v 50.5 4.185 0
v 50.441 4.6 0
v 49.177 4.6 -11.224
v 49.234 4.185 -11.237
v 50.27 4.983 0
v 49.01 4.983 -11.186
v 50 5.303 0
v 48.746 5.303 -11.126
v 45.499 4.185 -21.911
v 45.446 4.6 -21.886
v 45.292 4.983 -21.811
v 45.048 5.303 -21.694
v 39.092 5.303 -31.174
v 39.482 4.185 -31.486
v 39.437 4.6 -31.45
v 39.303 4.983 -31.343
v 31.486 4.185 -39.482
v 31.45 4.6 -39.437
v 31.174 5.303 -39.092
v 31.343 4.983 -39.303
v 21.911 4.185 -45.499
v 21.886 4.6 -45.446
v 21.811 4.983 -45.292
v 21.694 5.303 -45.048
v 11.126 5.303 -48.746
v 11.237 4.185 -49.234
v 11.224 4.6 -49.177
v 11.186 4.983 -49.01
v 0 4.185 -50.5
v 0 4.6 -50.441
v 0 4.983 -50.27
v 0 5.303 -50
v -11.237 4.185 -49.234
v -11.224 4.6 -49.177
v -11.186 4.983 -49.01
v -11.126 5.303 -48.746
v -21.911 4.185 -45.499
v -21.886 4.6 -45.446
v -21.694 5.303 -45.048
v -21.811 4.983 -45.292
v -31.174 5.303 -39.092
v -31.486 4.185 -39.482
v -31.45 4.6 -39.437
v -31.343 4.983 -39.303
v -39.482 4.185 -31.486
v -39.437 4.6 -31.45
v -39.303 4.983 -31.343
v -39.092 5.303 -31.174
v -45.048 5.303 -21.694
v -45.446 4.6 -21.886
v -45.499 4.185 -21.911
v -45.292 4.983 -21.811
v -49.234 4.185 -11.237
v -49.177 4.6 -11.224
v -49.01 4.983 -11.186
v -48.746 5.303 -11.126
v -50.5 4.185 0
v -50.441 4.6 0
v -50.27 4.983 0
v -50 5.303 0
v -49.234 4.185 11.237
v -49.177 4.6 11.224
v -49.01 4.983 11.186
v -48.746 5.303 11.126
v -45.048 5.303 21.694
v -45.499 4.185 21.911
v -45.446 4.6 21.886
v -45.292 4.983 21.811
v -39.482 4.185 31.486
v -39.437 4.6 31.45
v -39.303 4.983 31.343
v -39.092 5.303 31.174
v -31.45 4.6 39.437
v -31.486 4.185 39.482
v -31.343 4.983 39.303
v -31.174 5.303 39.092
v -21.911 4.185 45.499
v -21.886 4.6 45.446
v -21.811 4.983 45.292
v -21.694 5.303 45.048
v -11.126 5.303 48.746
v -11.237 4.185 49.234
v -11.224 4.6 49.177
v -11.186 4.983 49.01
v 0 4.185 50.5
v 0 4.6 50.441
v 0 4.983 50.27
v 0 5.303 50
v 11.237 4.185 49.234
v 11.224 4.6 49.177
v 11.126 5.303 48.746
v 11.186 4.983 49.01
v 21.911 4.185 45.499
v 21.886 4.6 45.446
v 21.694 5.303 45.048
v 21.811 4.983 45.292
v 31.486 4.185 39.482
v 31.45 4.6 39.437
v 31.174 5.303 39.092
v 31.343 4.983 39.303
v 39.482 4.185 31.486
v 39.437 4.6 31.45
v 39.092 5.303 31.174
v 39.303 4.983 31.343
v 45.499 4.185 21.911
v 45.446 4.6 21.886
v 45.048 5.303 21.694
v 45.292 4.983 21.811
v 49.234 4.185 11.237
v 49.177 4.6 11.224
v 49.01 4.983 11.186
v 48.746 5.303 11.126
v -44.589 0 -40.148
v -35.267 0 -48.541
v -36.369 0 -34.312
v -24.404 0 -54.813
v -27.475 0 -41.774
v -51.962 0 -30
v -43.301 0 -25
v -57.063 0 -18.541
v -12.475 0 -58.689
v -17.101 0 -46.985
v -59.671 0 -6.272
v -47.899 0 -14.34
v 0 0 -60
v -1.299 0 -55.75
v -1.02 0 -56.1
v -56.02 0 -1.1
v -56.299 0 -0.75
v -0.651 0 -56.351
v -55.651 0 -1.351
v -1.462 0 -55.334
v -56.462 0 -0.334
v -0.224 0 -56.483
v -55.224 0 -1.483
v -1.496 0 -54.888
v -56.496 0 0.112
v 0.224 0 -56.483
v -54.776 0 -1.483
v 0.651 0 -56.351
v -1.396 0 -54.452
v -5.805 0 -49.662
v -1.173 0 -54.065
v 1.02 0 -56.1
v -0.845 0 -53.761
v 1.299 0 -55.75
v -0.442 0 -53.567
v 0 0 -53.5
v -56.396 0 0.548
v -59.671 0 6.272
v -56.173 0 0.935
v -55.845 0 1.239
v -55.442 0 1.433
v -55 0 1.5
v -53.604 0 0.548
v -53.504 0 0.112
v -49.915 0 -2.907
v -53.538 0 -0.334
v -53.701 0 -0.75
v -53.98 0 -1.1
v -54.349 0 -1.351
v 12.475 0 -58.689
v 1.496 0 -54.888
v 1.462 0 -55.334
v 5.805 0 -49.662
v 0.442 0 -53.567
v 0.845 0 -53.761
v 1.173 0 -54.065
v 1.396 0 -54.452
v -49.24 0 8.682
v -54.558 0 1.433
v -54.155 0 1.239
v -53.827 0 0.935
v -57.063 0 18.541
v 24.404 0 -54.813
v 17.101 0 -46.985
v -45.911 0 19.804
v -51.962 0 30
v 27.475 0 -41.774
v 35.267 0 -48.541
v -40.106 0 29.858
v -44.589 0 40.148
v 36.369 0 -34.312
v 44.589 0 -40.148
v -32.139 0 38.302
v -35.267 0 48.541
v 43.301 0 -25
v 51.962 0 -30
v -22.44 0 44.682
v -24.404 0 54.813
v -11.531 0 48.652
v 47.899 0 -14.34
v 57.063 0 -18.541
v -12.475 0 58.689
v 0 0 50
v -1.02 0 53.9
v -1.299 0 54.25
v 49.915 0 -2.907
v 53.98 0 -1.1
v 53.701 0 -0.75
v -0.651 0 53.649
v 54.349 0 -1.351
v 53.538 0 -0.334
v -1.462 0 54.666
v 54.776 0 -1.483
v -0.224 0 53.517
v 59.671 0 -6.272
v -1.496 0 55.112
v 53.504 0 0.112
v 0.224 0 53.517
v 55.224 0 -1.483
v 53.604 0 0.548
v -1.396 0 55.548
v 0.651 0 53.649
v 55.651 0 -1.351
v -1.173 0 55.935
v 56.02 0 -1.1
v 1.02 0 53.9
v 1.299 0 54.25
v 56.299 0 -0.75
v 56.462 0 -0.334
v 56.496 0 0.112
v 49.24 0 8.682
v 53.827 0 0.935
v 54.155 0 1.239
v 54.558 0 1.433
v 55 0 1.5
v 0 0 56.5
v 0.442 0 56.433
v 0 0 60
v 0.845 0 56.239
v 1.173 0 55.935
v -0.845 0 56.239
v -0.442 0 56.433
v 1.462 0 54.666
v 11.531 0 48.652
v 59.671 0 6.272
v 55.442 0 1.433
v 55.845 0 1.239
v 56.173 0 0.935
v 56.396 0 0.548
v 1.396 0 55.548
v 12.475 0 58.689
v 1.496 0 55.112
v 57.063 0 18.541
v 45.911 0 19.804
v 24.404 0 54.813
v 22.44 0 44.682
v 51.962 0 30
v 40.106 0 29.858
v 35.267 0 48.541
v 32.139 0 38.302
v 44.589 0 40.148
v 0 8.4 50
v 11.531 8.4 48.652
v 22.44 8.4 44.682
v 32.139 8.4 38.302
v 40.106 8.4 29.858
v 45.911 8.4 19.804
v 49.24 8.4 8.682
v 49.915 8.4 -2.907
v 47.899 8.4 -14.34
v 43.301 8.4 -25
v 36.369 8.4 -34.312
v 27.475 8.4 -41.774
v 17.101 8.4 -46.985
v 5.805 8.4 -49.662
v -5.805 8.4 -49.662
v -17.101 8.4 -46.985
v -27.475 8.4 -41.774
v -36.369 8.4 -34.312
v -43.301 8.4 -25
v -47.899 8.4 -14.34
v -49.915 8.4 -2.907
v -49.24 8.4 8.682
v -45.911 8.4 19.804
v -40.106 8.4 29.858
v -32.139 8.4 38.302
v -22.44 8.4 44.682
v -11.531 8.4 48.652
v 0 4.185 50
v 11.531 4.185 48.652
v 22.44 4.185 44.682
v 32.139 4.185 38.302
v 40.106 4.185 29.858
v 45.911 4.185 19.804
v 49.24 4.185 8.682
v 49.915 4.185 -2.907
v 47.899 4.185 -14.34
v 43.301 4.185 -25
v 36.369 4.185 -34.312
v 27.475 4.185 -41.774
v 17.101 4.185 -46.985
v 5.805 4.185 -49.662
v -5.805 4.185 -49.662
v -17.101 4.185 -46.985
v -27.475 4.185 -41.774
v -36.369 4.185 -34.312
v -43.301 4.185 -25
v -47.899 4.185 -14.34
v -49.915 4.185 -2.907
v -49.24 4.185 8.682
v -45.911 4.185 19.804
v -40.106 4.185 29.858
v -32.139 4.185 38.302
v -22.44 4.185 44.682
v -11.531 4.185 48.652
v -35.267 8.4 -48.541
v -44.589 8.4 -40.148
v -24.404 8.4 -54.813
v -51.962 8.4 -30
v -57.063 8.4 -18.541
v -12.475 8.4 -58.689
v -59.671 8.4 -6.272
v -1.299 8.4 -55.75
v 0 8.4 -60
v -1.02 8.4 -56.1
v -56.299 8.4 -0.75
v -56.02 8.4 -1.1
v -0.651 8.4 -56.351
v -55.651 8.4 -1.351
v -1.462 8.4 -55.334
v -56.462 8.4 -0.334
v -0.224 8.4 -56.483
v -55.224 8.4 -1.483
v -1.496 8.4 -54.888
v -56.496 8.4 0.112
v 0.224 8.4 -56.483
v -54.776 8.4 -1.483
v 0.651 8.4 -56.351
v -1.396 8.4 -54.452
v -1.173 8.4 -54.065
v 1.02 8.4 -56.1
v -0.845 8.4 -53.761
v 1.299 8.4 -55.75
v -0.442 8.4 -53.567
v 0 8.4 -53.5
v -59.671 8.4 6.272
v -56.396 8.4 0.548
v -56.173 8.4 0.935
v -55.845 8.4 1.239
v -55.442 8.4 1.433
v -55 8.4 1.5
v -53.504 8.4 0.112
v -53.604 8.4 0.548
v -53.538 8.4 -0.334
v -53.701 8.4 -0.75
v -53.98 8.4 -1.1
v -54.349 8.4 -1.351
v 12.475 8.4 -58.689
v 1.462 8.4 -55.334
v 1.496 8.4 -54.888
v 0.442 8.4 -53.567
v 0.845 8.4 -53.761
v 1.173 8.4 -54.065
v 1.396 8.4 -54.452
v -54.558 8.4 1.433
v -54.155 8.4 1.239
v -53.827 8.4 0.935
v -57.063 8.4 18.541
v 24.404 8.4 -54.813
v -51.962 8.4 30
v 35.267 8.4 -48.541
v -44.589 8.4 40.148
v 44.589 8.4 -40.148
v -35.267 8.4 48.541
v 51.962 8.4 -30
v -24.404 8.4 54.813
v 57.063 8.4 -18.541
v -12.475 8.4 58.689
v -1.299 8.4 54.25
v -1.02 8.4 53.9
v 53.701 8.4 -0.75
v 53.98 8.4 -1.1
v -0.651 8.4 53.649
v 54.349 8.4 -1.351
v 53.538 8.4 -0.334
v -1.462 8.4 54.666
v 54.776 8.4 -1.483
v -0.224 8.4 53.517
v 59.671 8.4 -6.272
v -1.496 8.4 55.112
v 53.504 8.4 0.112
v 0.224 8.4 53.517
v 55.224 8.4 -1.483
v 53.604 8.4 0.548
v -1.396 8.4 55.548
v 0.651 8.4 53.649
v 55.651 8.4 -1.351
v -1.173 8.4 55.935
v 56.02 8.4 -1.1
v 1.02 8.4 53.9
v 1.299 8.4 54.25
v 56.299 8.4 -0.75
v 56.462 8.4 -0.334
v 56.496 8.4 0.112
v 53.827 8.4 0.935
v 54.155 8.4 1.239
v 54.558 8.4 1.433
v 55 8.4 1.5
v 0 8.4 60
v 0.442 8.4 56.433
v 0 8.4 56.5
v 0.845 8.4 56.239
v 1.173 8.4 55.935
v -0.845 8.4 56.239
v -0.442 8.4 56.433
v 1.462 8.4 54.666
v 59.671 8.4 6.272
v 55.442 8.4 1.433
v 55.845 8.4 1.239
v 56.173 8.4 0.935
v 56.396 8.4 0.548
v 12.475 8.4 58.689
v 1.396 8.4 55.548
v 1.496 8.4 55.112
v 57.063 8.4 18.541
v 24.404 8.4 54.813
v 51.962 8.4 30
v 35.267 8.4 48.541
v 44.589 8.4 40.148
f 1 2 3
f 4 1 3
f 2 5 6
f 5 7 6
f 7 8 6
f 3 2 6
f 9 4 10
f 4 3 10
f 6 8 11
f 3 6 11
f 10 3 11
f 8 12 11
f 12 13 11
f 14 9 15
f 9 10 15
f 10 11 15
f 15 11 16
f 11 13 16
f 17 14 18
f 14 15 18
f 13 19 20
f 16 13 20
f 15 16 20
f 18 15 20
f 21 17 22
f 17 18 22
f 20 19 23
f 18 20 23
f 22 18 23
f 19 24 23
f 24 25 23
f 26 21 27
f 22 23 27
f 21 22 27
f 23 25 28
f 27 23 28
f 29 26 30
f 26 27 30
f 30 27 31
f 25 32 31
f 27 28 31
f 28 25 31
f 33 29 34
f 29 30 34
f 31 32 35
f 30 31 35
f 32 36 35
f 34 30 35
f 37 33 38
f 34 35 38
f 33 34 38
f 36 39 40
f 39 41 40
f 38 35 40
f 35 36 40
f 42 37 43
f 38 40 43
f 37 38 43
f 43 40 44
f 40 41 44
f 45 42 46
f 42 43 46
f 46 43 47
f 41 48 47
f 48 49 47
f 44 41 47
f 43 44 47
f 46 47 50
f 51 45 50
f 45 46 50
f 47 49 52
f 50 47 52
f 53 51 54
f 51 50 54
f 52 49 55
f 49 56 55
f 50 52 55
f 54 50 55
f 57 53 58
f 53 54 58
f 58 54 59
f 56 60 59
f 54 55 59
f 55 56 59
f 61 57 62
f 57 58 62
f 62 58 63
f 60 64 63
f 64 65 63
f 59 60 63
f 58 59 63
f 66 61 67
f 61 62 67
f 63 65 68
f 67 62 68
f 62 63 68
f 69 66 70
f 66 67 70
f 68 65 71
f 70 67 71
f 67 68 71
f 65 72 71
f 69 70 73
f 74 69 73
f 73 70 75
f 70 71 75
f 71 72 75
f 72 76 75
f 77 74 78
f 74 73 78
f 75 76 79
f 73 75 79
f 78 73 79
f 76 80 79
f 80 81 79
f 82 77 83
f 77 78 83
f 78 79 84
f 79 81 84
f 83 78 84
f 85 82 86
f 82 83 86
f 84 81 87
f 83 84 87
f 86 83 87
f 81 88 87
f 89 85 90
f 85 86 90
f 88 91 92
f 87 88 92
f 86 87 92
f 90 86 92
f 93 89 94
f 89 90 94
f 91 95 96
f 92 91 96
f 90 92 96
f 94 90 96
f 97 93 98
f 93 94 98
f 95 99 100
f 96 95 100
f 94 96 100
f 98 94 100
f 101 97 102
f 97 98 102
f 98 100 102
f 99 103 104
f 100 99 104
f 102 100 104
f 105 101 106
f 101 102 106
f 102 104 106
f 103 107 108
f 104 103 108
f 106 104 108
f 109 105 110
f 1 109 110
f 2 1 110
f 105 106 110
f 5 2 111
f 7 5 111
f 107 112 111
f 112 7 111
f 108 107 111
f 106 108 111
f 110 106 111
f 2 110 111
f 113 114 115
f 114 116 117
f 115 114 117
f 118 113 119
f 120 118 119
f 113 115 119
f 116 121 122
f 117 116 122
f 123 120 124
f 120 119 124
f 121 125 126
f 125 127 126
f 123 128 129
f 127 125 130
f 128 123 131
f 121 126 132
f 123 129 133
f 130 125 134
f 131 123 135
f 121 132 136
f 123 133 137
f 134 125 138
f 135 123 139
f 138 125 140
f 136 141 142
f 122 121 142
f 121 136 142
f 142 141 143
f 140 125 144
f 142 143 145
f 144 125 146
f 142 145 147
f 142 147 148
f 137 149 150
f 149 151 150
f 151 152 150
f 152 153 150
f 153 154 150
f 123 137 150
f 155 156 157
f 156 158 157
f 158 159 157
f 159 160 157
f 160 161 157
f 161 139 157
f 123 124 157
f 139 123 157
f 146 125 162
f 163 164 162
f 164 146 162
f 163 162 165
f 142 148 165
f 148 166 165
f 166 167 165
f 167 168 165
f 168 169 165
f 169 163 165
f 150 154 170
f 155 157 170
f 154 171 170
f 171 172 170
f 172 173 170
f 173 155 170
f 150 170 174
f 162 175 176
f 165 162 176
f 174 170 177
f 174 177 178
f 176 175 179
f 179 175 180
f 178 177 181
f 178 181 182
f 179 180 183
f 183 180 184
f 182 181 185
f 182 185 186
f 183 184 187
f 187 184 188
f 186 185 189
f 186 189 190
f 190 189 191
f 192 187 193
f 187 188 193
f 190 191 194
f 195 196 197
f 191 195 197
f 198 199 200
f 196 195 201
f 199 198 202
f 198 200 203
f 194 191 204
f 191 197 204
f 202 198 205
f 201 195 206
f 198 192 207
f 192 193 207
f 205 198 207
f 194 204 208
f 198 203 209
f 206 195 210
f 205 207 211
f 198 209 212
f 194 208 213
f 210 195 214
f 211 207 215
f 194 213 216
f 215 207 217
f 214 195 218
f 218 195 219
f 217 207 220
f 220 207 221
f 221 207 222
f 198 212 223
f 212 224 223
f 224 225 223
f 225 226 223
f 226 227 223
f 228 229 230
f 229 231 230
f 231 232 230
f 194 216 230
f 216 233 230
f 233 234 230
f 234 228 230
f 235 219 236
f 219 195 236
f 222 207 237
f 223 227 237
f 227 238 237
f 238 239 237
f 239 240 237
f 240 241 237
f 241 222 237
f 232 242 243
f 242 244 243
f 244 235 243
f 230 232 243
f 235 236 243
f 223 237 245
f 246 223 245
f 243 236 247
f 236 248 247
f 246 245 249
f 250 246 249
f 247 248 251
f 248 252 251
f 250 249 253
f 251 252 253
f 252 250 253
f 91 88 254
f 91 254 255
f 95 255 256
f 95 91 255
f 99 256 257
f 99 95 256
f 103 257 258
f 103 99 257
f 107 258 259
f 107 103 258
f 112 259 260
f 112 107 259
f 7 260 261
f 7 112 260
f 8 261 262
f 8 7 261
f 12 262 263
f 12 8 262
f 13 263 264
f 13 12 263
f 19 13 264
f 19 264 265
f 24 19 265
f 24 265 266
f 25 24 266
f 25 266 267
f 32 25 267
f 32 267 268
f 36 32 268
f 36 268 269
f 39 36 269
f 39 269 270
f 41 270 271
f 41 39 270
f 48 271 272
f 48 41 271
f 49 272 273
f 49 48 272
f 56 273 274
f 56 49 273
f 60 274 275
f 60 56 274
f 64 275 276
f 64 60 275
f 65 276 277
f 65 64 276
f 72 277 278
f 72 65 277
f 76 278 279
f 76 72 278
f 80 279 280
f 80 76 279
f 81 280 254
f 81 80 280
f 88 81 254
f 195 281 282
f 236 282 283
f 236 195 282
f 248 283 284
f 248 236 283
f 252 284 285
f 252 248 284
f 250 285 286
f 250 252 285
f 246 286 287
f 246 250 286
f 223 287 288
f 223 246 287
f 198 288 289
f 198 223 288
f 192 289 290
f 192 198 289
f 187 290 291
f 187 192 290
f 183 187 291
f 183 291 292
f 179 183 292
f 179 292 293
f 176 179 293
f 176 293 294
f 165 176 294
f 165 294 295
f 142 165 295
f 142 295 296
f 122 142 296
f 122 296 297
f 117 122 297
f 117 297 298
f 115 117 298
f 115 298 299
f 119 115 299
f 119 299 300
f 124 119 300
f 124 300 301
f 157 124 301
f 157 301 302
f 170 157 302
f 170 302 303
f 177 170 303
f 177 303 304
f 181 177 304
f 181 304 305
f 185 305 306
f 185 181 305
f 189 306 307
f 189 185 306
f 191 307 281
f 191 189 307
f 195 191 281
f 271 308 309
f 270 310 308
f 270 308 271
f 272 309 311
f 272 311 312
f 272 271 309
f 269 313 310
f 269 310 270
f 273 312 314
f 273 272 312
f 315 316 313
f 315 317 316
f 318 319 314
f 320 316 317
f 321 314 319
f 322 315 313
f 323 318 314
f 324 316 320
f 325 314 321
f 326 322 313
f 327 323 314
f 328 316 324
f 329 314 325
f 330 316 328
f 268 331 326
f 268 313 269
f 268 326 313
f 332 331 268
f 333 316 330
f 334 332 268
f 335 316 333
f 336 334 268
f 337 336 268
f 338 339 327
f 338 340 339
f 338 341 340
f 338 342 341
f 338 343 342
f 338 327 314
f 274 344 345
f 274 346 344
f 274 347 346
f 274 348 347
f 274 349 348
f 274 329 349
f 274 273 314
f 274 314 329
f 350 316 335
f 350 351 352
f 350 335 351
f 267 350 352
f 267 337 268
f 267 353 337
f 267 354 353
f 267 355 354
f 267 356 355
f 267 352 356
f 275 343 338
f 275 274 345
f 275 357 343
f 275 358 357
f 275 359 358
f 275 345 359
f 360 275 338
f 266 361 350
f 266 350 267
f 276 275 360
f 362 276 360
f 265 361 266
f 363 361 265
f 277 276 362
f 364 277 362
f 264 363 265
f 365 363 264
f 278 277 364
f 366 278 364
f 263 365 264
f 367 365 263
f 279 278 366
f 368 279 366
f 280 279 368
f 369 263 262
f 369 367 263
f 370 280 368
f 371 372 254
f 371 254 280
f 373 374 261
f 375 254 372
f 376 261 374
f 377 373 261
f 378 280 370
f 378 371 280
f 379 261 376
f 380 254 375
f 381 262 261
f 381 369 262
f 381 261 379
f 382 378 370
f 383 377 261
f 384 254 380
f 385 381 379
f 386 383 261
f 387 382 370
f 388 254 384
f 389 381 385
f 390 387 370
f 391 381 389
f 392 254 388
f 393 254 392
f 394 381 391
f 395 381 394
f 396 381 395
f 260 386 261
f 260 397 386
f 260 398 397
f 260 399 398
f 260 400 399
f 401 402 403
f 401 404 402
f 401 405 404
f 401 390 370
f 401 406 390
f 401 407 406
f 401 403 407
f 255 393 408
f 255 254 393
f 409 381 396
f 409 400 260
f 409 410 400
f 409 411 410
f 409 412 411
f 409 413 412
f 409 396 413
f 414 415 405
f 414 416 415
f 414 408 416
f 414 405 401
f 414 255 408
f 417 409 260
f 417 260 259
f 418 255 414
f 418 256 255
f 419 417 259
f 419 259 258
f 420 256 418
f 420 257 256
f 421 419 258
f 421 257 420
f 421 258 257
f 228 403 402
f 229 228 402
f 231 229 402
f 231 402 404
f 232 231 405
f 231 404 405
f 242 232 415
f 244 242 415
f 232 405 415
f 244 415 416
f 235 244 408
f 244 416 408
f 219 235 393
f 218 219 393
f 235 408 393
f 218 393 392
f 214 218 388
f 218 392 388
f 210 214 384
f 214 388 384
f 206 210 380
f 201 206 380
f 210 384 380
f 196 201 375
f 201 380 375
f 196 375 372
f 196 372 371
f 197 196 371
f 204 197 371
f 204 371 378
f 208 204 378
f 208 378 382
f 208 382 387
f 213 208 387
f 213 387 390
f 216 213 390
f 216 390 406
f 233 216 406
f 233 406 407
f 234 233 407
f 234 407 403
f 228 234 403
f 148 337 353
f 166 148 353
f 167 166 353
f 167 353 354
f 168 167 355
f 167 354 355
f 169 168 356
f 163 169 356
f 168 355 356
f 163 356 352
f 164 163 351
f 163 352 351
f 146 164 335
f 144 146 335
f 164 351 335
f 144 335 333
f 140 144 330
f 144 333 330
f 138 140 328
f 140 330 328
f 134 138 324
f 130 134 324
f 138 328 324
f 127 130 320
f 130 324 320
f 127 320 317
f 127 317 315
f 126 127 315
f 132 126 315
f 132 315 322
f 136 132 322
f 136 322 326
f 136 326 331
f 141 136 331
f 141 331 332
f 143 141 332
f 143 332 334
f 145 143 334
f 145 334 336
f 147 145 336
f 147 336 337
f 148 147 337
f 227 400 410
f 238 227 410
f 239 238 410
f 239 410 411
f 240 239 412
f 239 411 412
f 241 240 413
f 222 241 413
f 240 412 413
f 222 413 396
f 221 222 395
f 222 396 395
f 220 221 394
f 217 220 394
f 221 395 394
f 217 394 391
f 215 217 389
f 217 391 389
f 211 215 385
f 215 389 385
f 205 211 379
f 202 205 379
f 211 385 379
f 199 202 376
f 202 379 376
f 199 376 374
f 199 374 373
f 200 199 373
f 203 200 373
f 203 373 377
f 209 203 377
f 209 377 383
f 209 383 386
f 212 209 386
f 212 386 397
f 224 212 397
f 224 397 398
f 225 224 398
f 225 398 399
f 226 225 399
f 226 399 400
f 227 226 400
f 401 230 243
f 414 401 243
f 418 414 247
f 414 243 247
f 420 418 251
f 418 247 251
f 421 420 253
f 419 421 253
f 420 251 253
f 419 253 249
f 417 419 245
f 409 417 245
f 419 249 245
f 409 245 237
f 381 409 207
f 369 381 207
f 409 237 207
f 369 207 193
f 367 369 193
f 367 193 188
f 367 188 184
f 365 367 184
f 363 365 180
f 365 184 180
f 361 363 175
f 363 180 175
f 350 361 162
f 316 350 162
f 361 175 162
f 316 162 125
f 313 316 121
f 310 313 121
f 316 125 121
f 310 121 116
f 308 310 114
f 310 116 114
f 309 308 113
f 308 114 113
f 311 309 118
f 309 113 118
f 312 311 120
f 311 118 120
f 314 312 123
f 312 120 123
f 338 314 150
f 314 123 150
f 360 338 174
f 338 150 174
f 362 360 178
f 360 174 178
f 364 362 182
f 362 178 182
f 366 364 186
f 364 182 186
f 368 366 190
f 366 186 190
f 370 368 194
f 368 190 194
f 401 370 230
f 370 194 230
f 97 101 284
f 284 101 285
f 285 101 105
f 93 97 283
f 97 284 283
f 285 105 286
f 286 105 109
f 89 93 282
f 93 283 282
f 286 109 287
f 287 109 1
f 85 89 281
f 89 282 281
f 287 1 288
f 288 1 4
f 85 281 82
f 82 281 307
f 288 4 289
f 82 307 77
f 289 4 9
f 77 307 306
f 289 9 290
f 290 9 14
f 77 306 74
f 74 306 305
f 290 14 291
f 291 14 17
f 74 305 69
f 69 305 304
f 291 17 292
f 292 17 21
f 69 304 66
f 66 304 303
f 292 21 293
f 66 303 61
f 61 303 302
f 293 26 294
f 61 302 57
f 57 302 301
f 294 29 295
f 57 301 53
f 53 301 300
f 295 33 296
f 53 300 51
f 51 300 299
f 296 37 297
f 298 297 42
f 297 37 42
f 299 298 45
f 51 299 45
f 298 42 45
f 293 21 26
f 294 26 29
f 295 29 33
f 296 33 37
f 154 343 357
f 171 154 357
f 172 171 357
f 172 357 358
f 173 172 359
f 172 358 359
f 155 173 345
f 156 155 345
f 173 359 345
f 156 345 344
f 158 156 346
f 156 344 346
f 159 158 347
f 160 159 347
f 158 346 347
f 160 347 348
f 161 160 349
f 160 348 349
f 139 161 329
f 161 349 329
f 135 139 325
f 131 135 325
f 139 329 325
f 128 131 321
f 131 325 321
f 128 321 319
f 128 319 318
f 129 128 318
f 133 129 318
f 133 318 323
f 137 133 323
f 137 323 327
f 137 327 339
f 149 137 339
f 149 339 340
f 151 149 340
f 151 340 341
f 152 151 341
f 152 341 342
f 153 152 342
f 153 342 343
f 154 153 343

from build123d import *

# Parameters (mm, degrees)
SKETCH_1_R          = 60
SKETCH_1_R_2        = 50
EXTRUDE_2_DEPTH     = 8.4
SKETCH_5_R          = 1.5
CUT_EXTRUDE_1_DEPTH = 10


with BuildPart() as part:
    # 草图1 → 凸台-拉伸2 (new body)
    with BuildSketch(Plane(origin=(0, 0, 0), x_dir=(1, 0, 0), z_dir=(0, 1, 0))):
        Circle(SKETCH_1_R)
        Circle(SKETCH_1_R_2, mode=Mode.SUBTRACT)
    extrude(amount=EXTRUDE_2_DEPTH)

    # 草图4 → 切除-旋转1 (revolve, cut)
    with BuildSketch(Plane.XY):
        with BuildLine():
            ThreePointArc((-50, 5.302978388), (-50.369306394, 4.797316835), (-50.5, 4.184944399))
            Line((-50.5, 4.184944399), (0, 4.184944399))
            Line((0, 4.184944399), (0, 5.302978388))
            Line((0, 5.302978388), (-50, 5.302978388))
        make_face()
    revolve(axis=Axis((0, 5.302978388, 0), (0, -1, 0)), mode=Mode.SUBTRACT)

    # 草图5 → 切除-拉伸1 (cut)
    with BuildSketch(Plane(origin=(0, 8.4, 0), x_dir=(1, 0, 0), z_dir=(0, 1, 0))):
        with Locations((0, 55)):
            Circle(SKETCH_5_R)
        with Locations((55, 0)):
            Circle(SKETCH_5_R)
        with Locations((-55, 0)):
            Circle(SKETCH_5_R)
        with Locations((0, -55)):
            Circle(SKETCH_5_R)
    extrude(amount=-CUT_EXTRUDE_1_DEPTH, mode=Mode.SUBTRACT)


solid = part.part
